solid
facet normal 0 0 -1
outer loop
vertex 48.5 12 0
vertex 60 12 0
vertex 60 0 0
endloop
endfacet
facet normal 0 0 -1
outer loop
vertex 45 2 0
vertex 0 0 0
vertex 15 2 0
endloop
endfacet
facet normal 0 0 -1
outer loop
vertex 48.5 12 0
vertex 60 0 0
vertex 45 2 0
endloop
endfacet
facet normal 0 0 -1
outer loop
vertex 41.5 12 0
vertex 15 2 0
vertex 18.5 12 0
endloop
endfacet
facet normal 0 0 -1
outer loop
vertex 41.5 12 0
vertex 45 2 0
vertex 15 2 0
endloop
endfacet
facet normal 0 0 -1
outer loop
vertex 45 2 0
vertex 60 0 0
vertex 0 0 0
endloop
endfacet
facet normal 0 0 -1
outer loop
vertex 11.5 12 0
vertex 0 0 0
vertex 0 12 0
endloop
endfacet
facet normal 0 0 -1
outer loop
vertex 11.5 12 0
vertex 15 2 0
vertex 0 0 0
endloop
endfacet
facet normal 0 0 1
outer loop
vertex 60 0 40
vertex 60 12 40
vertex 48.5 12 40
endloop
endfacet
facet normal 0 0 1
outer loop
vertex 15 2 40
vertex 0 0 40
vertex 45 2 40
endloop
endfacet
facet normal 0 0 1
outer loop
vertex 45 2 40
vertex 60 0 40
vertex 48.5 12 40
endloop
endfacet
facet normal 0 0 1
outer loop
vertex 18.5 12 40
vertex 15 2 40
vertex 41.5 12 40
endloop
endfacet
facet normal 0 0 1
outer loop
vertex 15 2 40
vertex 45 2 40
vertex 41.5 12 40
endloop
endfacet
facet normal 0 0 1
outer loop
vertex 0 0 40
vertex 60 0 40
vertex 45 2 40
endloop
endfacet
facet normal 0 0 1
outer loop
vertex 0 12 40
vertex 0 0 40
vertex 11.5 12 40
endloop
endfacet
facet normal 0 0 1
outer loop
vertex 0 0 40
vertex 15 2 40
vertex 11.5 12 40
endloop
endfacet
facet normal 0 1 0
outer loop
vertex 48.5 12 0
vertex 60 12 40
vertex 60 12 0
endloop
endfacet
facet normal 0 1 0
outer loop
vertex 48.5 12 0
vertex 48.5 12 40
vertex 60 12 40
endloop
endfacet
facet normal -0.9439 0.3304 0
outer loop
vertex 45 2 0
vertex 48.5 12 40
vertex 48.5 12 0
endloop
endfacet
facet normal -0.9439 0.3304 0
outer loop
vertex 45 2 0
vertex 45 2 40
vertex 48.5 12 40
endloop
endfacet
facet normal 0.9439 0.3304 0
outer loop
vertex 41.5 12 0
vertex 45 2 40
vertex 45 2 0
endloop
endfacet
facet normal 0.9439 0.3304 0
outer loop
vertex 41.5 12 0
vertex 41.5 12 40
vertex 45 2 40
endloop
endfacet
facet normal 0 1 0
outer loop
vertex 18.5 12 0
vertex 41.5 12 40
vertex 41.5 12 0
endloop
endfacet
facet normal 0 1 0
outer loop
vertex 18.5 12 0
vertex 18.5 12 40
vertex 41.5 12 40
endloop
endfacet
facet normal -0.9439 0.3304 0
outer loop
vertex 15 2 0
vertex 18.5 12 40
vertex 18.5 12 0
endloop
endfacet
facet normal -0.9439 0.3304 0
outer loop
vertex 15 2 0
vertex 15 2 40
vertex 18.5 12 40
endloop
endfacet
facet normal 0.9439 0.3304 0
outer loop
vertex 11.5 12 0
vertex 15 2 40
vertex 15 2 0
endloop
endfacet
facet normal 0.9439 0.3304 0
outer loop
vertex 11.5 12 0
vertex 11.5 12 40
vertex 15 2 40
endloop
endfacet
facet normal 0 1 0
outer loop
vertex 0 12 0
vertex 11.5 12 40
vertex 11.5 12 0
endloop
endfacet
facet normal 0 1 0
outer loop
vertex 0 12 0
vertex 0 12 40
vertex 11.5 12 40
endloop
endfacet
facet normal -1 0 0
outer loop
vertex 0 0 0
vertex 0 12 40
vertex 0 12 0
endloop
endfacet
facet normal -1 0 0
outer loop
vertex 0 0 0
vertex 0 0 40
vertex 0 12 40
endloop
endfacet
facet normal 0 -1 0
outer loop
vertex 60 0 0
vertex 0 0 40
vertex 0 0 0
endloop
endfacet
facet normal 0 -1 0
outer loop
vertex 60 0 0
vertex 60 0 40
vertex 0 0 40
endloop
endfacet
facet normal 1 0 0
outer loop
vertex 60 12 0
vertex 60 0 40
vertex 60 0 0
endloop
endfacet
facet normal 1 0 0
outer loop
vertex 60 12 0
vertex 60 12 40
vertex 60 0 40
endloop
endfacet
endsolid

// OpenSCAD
$fn = 32;

// ----------------------------------------------------------------------
// V guide rail: doublev, 60 mm wide
// ----------------------------------------------------------------------

// --- parameters (mm) ---
rail_w = 60;              // rail width, X
base_t = 12;              // base plate thickness
v_depth = 10;             // V feature depth / height
v_half_w = 7;             // half width of the V at the base face
plate_t = 40;             // rail length, Z (the extrusion height)
groove_off = 15;          // offset of each groove from the centreline

centre_x = rail_w / 2;  // rail centreline
groove_a = centre_x - groove_off;  // axis of the first groove
groove_b = centre_x + groove_off;  // axis of the second groove

profile = [[0, 0], [60, 0], [60, 12], [48.5, 12], [45, 2], [41.5, 12], [18.5, 12], [15, 2], [11.5, 12], [0, 12]];  // primary outline, 10 points, counter clockwise

// --- the one profile operation ---
linear_extrude(height = plate_t) polygon(points = profile);
